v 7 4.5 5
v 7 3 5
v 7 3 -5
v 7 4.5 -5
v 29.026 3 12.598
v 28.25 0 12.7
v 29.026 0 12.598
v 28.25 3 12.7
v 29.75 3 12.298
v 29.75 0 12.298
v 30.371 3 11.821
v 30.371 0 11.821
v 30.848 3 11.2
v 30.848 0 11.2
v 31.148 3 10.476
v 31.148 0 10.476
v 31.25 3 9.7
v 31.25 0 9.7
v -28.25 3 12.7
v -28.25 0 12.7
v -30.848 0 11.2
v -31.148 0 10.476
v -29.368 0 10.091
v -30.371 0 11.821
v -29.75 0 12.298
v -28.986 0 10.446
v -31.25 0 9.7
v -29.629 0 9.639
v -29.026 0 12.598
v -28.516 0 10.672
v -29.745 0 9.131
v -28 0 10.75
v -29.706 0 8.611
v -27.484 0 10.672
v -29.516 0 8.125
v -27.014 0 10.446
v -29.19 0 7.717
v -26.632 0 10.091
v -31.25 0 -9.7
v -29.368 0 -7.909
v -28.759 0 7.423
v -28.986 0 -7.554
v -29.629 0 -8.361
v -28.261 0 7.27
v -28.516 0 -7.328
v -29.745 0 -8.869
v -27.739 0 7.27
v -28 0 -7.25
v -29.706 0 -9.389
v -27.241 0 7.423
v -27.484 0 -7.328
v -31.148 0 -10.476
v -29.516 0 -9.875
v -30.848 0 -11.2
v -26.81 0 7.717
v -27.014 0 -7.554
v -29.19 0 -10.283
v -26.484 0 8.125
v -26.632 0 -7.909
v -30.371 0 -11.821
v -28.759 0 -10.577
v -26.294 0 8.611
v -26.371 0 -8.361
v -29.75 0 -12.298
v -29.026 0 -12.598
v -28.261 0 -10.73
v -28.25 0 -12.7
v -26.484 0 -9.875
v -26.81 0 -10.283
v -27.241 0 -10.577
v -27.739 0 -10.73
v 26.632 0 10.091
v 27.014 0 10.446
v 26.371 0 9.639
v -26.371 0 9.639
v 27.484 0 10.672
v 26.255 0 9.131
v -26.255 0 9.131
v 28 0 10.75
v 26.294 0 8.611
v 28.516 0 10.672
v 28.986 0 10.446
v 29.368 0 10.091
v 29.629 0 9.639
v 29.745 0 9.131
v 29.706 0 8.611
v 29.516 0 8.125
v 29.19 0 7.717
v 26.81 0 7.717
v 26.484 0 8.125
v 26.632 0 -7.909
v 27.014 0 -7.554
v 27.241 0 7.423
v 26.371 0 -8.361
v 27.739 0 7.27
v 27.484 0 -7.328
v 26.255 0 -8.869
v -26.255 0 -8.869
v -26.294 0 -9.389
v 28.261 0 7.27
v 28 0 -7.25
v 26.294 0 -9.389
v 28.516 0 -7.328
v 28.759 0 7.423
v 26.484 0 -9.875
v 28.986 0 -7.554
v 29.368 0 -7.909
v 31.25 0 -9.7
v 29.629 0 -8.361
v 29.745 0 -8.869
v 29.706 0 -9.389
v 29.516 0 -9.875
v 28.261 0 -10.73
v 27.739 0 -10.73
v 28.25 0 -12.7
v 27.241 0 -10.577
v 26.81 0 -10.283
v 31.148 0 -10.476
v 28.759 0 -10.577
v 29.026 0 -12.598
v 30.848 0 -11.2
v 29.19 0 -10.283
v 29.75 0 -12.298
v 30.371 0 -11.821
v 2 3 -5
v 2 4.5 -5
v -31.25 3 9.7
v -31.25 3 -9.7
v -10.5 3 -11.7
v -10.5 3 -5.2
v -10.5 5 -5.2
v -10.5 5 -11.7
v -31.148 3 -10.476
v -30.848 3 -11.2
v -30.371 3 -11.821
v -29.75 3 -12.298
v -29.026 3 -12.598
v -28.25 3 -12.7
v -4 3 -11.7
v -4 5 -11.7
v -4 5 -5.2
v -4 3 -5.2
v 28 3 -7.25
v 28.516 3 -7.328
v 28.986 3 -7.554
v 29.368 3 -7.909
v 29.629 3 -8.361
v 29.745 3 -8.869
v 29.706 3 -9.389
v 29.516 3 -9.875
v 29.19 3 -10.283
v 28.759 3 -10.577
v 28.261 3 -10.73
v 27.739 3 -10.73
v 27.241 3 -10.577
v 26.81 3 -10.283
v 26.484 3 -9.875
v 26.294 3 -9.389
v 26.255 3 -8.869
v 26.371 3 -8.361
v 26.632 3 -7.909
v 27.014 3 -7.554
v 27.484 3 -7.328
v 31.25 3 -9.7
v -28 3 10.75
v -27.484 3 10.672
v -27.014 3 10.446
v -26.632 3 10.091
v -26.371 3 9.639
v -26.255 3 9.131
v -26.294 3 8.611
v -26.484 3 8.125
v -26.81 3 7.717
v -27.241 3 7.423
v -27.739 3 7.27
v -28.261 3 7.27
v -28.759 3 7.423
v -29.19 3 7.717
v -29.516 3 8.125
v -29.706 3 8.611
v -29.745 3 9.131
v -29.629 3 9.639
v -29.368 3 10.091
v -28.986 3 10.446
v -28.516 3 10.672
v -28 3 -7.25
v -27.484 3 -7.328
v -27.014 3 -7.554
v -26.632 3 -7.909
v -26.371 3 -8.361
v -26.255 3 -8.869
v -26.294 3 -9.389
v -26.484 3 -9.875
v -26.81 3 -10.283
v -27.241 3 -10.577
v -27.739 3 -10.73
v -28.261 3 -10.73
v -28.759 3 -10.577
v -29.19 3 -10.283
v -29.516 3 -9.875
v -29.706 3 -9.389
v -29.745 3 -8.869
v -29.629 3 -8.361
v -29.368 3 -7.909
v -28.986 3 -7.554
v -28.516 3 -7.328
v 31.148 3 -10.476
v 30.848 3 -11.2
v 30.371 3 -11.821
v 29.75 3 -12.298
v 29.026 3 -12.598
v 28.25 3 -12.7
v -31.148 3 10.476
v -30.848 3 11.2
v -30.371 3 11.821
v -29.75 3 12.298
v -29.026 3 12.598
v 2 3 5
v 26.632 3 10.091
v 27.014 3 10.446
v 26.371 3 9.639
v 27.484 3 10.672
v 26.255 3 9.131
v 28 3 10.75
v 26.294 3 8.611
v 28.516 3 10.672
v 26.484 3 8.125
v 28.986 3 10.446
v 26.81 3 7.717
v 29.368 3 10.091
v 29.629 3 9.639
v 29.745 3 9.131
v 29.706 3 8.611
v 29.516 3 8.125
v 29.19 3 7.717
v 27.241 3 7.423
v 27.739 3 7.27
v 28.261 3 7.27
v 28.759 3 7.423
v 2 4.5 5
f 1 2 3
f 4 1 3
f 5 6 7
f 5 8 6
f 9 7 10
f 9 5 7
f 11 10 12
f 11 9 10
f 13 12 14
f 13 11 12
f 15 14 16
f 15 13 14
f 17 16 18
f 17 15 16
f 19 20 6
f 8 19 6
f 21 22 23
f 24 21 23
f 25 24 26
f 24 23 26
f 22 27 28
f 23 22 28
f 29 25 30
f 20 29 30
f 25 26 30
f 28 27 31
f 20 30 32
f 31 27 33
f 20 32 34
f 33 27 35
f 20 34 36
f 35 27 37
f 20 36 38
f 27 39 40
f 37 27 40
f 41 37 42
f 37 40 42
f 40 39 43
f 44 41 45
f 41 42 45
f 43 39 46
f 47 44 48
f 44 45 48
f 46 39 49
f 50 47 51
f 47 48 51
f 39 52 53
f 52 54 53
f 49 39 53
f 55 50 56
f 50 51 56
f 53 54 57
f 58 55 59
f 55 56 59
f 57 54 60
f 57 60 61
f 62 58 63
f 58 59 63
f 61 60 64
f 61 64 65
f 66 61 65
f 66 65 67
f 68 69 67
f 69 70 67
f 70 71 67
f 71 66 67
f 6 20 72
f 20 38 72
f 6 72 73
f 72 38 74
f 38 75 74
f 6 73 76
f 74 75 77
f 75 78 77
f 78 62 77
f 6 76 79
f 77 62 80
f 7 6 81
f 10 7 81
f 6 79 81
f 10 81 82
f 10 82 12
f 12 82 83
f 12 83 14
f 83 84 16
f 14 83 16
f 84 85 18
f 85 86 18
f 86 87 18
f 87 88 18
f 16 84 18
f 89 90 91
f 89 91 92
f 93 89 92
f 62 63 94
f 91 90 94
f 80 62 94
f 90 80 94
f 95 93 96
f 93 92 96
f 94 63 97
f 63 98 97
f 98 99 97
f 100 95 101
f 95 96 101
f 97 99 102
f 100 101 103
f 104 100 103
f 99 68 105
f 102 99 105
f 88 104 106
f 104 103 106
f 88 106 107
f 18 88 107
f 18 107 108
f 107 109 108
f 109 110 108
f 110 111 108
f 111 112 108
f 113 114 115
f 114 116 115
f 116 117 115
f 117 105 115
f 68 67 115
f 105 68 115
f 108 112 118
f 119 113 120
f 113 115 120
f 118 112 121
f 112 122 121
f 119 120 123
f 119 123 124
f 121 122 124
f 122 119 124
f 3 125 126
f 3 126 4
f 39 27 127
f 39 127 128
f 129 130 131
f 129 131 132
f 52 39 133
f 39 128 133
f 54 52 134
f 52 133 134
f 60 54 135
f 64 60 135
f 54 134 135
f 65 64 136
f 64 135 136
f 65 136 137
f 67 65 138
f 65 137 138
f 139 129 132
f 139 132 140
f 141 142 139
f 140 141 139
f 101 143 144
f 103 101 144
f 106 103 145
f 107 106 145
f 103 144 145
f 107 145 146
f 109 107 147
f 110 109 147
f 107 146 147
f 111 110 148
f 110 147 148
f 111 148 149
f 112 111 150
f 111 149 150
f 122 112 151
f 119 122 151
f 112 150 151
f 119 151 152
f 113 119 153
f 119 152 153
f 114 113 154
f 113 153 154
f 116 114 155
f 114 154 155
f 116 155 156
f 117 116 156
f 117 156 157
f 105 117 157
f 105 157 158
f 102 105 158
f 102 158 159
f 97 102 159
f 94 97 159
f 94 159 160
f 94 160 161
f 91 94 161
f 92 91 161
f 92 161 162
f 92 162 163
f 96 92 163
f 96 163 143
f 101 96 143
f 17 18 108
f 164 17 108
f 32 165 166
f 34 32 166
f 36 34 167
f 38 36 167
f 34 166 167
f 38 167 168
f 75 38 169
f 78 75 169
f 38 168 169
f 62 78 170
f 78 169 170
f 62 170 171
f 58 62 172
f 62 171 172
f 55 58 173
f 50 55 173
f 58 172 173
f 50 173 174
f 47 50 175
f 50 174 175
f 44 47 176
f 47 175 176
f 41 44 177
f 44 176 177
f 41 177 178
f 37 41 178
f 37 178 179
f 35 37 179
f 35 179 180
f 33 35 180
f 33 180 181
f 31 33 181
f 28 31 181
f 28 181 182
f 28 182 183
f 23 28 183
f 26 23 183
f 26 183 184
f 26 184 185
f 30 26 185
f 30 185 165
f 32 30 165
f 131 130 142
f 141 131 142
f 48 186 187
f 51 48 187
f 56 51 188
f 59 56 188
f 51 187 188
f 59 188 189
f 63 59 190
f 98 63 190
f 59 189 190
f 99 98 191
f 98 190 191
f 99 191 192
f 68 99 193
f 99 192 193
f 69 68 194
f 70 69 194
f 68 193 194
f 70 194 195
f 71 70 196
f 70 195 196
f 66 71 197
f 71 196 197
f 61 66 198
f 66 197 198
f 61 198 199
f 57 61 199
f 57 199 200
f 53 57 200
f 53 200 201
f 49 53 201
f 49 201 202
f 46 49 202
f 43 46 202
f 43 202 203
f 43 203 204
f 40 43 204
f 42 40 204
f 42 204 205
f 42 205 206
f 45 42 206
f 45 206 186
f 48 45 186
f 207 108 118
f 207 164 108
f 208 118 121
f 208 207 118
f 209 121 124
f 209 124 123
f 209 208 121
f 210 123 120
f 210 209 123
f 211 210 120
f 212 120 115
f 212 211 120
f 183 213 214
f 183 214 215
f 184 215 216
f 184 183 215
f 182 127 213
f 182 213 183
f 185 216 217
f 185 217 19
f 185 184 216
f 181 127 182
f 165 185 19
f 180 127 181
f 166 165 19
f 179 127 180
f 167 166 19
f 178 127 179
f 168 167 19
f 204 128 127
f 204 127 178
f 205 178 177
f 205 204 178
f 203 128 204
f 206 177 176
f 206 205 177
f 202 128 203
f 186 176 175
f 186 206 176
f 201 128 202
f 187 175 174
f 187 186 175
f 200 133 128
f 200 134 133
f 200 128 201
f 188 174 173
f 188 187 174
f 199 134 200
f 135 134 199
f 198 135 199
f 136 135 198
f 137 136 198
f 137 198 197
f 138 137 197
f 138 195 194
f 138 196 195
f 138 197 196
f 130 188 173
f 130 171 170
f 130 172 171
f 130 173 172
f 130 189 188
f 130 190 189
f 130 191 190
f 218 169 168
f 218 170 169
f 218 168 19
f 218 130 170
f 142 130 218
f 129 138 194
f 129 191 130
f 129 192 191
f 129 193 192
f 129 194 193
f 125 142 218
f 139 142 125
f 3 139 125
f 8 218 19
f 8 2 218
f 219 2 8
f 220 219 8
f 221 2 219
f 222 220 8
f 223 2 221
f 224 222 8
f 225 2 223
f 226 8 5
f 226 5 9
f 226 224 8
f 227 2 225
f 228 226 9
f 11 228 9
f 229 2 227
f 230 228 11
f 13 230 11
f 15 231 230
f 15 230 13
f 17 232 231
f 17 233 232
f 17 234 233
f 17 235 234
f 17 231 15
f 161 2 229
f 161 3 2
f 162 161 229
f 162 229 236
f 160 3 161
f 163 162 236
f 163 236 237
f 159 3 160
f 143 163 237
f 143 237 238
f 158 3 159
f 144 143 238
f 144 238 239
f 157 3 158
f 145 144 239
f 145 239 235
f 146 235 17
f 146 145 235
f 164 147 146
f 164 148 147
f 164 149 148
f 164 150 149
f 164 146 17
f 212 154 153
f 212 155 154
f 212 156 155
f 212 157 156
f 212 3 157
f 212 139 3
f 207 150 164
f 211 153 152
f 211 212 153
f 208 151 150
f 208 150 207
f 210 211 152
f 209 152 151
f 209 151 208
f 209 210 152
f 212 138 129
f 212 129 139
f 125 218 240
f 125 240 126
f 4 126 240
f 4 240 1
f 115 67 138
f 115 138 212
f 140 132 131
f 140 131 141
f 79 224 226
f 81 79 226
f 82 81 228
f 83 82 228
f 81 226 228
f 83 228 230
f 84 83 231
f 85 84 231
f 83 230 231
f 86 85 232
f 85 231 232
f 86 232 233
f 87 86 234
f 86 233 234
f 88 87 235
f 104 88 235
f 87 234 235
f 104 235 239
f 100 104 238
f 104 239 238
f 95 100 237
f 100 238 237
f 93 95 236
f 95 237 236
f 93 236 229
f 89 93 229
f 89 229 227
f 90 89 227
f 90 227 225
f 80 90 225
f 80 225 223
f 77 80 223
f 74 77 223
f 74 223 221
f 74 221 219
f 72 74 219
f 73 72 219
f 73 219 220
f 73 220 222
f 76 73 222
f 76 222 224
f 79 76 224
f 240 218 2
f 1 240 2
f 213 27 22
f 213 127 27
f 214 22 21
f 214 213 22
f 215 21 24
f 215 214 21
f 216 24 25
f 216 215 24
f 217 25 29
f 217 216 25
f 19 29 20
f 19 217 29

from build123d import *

# Parameters (mm, degrees)
SKETCH1_W           = 62.5
SKETCH1_H           = 25.4
BOSS_EXTRUDE1_DEPTH = 3
FILLET1_R           = 3
SKETCH2_R           = 1.75
CUT_EXTRUDE1_DEPTH  = 34.865210763
SKETCH6_W           = 6.5
SKETCH6_H           = 6.5
BOSS_EXTRUDE2_DEPTH = 2
SKETCH7_W           = 5
SKETCH7_H           = 10
BOSS_EXTRUDE3_DEPTH = 1.5


with BuildPart() as part:
    # Sketch1 → Boss-Extrude1 (new body)
    with BuildSketch(Plane(origin=(0, 0, 0), x_dir=(1, 0, 0), z_dir=(0, 1, 0))):
        Rectangle(SKETCH1_W, SKETCH1_H)
    extrude(amount=BOSS_EXTRUDE1_DEPTH)

    # Fillet1
    fillet1_edges = [part.edges().sort_by_distance(p)[0] for p in [
        (31.25, 1.5, 12.7),
        (-31.25, 1.5, 12.7),
        (-31.25, 1.5, -12.7),
        (31.25, 1.5, -12.7),
    ]]
    fillet(fillet1_edges, radius=FILLET1_R)

    # Sketch2 → Cut-Extrude1 (cut, through all)
    with BuildSketch(Plane(origin=(0, 3, 0), x_dir=(1, 0, 0), z_dir=(0, 1, 0))):
        with Locations(Location((-28, 9, 0), (0, 0, 270))):
            Circle(SKETCH2_R)
        with Locations(Location((28, 9, 0), (0, 0, 270))):
            Circle(SKETCH2_R)
        with Locations(Location((28, -9, 0), (0, 0, 270))):
            Circle(SKETCH2_R)
        with Locations(Location((-28, -9, 0), (0, 0, 270))):
            Circle(SKETCH2_R)
    extrude(amount=-CUT_EXTRUDE1_DEPTH, mode=Mode.SUBTRACT)

    # Sketch6 → Boss-Extrude2 (add)
    with BuildSketch(Plane(origin=(0, 3, 0), x_dir=(1, 0, 0), z_dir=(0, 1, 0))):
        with Locations((-7.25, 8.45)):
            Rectangle(SKETCH6_W, SKETCH6_H)
    extrude(amount=BOSS_EXTRUDE2_DEPTH)

    # Sketch7 → Boss-Extrude3 (add)
    with BuildSketch(Plane(origin=(0, 3, 0), x_dir=(1, 0, 0), z_dir=(0, 1, 0))):
        with Locations((4.5, 0)):
            Rectangle(SKETCH7_W, SKETCH7_H)
    extrude(amount=BOSS_EXTRUDE3_DEPTH)


solid = part.part
